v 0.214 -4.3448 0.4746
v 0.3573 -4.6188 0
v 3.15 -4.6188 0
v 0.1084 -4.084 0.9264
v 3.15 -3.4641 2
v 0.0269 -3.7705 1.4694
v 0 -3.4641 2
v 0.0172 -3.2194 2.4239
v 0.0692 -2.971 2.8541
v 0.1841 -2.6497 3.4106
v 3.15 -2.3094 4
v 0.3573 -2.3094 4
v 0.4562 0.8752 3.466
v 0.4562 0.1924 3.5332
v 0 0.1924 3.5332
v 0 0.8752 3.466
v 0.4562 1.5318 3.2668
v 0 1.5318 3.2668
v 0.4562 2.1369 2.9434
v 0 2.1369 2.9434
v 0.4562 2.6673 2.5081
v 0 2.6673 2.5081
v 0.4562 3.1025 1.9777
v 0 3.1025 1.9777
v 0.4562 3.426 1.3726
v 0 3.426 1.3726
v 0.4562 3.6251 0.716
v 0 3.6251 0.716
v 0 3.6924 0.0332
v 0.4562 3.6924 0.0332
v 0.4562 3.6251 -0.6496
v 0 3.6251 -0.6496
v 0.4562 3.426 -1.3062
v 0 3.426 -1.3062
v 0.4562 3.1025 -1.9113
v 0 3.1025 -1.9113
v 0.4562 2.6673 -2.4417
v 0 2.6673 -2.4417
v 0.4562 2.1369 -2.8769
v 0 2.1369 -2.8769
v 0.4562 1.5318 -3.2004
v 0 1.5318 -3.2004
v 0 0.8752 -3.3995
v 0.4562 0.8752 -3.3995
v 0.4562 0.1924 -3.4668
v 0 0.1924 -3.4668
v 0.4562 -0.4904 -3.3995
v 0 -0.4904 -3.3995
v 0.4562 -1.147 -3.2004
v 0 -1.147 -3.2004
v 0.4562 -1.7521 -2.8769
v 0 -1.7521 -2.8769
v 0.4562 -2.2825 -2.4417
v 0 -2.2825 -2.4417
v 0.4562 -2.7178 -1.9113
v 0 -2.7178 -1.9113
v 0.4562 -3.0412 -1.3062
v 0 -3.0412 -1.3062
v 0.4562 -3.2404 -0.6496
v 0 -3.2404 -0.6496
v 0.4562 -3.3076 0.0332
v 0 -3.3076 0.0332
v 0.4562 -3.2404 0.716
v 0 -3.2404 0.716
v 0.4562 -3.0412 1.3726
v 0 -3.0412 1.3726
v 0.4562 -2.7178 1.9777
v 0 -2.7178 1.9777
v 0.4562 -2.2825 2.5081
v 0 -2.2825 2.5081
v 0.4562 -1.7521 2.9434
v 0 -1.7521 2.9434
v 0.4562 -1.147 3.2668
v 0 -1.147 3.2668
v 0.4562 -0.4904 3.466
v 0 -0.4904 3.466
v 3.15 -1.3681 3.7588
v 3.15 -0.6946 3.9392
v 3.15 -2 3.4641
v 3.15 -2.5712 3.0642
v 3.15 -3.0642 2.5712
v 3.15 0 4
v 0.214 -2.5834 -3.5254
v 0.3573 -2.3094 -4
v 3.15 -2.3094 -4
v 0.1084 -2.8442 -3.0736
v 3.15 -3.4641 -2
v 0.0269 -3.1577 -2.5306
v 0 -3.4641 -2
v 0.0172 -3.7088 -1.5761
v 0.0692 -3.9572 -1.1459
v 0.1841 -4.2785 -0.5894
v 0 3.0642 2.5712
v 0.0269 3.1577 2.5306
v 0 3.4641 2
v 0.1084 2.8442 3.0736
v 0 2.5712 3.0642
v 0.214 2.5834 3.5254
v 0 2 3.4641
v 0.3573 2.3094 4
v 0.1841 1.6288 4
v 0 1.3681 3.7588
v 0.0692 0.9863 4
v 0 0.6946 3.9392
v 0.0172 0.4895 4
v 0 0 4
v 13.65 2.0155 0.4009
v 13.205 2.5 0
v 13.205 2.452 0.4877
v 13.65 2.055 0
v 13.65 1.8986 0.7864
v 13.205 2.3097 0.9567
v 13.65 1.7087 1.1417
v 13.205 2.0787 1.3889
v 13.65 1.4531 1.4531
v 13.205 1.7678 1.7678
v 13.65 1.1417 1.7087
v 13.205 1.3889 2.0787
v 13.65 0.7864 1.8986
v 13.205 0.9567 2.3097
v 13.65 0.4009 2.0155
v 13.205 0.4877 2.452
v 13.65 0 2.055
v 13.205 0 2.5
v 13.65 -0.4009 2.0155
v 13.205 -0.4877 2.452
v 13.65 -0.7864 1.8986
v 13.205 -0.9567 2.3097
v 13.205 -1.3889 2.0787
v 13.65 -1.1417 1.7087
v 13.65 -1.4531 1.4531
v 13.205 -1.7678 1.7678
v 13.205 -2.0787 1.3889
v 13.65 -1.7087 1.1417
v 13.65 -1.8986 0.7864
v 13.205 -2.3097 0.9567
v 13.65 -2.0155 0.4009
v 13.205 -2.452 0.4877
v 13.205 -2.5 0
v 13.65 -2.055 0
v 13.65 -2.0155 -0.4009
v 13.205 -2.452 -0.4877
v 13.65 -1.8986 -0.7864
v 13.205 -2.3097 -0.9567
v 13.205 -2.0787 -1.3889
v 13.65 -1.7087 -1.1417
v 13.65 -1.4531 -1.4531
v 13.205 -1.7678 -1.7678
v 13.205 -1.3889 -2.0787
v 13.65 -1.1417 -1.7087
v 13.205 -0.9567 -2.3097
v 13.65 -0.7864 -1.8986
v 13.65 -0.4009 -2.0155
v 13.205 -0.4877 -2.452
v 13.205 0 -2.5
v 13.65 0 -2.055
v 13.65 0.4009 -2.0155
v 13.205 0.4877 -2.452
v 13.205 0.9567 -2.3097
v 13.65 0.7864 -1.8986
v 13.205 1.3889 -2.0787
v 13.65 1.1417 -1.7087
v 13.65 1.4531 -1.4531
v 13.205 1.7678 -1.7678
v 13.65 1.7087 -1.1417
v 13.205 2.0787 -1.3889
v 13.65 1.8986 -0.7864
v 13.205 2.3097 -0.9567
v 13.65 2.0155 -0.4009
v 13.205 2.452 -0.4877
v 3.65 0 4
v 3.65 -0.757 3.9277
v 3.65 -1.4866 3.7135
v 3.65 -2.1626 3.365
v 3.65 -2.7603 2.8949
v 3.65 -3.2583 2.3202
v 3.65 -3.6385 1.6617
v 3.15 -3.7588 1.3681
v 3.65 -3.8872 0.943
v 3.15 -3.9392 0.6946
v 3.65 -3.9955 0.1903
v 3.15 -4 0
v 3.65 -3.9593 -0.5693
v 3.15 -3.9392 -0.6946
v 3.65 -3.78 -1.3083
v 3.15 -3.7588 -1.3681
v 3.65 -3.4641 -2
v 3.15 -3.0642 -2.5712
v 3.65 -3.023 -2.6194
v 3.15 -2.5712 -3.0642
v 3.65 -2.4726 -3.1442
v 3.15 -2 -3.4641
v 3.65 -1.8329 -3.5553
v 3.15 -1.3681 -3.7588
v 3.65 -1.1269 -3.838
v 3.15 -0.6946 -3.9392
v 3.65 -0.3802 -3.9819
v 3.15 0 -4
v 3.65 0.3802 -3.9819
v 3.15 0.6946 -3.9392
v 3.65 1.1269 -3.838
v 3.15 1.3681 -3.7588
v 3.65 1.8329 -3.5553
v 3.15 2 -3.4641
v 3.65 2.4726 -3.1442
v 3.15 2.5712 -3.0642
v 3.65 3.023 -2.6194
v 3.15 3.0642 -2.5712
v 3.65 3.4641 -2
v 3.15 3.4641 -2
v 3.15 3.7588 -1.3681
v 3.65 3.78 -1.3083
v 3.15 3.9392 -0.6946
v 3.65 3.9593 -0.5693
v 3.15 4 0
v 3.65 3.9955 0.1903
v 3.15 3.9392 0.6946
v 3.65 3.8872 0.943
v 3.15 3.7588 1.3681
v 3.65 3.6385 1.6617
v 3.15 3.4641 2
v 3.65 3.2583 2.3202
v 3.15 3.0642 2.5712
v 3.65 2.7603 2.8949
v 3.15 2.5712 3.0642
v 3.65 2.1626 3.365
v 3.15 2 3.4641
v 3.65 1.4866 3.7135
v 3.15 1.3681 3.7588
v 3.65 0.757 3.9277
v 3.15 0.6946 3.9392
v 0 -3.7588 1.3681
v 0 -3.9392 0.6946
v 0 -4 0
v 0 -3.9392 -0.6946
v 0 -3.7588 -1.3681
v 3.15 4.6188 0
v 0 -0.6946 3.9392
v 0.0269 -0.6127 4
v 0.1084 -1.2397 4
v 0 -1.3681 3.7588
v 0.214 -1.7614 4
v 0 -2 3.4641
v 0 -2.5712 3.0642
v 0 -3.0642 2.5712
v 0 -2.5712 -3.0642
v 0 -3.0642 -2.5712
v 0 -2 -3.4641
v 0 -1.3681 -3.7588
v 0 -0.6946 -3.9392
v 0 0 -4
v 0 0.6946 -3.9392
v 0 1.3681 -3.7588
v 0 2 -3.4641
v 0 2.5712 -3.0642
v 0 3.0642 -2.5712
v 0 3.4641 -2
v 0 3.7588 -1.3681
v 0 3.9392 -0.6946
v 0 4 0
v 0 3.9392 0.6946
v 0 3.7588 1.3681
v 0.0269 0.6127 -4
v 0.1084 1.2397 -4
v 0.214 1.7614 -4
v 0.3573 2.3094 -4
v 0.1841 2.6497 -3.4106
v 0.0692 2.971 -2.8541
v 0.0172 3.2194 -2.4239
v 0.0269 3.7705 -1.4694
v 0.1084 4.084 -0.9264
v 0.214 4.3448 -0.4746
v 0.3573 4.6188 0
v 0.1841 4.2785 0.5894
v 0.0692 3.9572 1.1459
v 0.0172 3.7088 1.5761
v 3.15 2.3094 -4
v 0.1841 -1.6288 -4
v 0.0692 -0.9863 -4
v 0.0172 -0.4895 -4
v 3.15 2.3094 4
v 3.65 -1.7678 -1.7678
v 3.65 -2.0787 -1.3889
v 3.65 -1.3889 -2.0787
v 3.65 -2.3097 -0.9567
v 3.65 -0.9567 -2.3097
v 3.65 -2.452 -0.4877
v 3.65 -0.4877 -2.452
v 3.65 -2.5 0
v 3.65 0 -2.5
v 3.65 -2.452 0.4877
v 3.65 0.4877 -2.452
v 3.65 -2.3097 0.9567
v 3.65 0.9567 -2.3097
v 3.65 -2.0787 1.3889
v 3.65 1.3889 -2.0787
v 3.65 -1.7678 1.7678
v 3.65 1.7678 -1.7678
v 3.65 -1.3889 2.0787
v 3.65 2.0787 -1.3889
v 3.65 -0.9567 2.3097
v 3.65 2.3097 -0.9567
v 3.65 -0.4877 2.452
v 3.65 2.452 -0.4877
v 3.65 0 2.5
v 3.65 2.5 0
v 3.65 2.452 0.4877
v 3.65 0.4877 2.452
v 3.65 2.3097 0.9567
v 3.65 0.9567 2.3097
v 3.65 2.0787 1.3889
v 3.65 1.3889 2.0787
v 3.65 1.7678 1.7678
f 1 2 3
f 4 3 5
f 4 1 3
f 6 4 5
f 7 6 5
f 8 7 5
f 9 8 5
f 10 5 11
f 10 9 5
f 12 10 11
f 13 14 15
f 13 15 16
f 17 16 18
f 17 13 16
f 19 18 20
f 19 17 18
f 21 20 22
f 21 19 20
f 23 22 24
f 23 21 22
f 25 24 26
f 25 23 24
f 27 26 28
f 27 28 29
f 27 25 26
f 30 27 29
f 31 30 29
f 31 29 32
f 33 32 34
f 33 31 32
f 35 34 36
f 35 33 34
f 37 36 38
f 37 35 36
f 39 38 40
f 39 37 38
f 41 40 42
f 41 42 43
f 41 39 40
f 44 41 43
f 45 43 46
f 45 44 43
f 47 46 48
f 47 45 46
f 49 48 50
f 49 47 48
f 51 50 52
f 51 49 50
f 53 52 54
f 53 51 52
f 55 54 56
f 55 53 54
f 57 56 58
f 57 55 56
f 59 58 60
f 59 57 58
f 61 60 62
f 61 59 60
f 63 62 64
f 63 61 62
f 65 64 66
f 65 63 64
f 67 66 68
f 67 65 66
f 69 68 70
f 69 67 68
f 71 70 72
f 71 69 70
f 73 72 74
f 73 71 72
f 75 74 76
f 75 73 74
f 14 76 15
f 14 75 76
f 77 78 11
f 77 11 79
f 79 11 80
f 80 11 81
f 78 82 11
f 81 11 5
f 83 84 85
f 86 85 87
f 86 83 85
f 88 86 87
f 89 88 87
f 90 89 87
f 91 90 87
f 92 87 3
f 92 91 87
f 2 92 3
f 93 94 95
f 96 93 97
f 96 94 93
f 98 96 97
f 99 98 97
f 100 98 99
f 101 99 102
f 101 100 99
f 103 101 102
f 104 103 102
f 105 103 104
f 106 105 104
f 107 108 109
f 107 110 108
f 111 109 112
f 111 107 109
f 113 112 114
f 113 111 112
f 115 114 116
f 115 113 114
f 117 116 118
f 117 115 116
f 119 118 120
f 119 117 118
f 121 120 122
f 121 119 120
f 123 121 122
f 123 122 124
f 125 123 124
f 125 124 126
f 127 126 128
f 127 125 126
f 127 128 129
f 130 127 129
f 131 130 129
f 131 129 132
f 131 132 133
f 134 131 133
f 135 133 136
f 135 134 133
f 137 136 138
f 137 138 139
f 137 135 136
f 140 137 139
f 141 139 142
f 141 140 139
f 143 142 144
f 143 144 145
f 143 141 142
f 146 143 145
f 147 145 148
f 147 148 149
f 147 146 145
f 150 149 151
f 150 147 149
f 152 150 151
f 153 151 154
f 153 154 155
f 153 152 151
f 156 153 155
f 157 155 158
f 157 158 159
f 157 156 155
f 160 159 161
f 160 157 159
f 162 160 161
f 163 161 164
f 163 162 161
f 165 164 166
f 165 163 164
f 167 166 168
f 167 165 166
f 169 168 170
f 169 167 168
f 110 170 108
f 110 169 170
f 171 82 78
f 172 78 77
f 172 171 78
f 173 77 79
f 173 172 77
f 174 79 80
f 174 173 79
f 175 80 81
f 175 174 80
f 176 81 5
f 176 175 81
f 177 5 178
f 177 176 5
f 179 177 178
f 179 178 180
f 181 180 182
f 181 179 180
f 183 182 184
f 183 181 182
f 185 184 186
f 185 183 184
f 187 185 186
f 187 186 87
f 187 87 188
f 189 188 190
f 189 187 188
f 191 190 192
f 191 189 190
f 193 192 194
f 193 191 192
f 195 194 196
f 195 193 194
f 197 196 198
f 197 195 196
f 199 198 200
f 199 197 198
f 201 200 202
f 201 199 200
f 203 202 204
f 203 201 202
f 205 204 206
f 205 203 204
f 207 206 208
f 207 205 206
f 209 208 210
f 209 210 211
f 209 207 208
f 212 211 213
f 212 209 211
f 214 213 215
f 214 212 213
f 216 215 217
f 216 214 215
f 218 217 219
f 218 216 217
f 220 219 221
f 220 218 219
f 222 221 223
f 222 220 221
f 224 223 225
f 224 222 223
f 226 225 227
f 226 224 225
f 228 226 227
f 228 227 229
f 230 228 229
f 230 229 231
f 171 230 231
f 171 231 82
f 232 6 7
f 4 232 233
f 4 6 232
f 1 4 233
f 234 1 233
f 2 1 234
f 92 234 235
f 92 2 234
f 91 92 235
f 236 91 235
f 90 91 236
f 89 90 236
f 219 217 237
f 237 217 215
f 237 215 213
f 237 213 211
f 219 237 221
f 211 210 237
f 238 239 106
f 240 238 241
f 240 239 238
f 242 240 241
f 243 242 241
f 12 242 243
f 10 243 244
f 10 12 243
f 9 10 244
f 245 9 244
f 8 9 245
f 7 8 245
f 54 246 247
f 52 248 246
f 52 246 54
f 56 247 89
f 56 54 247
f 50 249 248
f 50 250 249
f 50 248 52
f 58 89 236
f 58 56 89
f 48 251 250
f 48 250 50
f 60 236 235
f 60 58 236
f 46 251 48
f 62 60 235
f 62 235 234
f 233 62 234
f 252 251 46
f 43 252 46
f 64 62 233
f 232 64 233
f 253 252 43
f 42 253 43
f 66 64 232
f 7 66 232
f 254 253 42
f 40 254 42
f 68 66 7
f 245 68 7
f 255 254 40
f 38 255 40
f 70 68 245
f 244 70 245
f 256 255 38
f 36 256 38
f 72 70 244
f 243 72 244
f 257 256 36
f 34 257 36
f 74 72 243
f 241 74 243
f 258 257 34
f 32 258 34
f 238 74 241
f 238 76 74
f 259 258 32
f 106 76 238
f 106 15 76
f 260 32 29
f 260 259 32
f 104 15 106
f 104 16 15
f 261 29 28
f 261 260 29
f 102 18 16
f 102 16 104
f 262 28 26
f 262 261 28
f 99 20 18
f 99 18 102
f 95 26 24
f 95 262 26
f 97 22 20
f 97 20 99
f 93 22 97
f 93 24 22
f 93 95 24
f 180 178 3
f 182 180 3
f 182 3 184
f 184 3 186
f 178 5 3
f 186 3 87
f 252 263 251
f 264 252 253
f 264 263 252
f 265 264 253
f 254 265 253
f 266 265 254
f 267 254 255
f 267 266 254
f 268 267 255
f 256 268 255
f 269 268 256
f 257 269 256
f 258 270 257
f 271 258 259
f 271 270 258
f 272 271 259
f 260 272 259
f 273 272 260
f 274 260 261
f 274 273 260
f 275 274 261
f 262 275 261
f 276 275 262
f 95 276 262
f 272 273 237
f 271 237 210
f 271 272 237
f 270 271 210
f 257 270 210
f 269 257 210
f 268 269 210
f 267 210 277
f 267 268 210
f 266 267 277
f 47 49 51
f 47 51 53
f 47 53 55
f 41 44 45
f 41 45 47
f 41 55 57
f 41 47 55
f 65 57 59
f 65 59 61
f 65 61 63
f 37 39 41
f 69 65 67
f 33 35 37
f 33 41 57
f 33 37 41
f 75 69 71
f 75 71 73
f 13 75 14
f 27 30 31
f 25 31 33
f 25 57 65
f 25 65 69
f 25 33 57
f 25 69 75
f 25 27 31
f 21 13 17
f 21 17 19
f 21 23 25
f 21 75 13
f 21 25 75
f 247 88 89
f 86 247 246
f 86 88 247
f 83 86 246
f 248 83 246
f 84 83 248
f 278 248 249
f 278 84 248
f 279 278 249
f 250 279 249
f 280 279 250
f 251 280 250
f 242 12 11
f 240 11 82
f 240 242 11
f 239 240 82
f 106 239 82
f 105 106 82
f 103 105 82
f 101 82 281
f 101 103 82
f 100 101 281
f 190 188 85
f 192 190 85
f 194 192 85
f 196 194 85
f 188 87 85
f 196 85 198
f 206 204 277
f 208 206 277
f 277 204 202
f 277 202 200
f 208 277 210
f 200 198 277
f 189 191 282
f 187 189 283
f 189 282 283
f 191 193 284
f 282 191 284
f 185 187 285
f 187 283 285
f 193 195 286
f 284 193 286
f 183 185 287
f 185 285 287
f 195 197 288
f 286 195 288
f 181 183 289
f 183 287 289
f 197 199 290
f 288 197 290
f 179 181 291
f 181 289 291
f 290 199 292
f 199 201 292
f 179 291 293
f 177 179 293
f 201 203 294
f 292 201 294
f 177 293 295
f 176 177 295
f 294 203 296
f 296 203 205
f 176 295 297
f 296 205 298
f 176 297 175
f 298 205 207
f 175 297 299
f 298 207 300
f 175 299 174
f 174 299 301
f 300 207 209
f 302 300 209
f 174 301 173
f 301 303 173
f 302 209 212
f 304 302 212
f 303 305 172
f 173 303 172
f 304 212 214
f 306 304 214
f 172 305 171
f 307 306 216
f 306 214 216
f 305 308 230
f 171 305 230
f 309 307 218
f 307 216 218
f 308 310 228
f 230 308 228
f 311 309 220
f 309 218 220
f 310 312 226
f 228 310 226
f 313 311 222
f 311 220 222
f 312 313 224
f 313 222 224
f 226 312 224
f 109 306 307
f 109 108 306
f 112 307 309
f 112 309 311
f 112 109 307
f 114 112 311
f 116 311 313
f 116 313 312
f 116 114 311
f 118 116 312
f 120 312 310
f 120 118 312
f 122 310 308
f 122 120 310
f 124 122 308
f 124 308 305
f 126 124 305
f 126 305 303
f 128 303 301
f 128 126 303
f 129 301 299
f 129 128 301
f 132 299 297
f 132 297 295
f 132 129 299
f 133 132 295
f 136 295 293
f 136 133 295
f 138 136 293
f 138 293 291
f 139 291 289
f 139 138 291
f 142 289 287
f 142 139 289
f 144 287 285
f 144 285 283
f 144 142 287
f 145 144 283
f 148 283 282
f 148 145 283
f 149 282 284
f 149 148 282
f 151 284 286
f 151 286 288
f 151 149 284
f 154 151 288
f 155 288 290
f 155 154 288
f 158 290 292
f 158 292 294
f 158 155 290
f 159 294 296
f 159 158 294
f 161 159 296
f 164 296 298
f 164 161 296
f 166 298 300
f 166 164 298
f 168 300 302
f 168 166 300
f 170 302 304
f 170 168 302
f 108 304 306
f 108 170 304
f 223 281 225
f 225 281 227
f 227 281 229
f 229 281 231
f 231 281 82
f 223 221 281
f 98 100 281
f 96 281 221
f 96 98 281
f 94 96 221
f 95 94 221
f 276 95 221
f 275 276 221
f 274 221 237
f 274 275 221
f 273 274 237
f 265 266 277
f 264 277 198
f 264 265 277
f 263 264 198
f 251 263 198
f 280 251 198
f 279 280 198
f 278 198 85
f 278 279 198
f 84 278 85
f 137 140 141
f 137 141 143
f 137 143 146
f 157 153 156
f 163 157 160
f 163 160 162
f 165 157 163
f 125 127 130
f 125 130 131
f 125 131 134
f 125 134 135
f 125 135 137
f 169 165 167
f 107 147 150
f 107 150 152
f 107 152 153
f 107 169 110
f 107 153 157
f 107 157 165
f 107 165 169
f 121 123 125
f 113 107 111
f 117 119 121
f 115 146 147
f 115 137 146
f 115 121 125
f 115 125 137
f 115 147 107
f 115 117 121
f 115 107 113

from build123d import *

# Parameters (mm, degrees)
BASEHEAD_DEPTH     = 3.65
INDENT_START       = -0.45625
INDENT_2_OUTLINE_R = 3.5
INDENT_2_DEPTH     = 0.45625
SKETCH4_W          = 0.5
SKETCH4_H          = 10.618802154


# Read off the part's stored shape, not the designer's step: Indent
with BuildPart() as part:
    # Sketch1 → BaseHead (new body)
    with BuildSketch(Plane(origin=(0, 0, 0), x_dir=(0, 0, -1), z_dir=(1, 0, 0))):
        Polygon((4, 2.309401077), (4, -2.309401077), (0, -4.618802154), (-4, -2.309401077), (-4, 2.309401077), (0, 4.618802154), align=None)
    extrude(amount=BASEHEAD_DEPTH)

    # Indent outline → Indent (revolve)
    with BuildSketch(Plane.YX):
        Polygon((2.5, 3.65), (2.5, 13.205), (2.055, 13.65), (0, 13.65), (0, 3.65), align=None)
    revolve(axis=Axis((0, 0, 0), (1, 0, 0)))

    # Indent 2 outline → Indent 2 (cut)
    with BuildSketch(Plane.ZY.offset(INDENT_START)):
        with Locations((0.033212245, 0.192376607)):
            Circle(INDENT_2_OUTLINE_R)
    extrude(amount=INDENT_2_DEPTH, mode=Mode.SUBTRACT)

    # Sketch3 → HeadChamfer (revolve, cut)
    with BuildSketch(Plane.XY, mode=Mode.PRIVATE) as headchamfer_sk:
        Polygon((0, 4), (3.244016936, 9.618802154), (3.244016936, 14.618802154), (-10, 14.618802154), (-10, 4), align=None)
    revolve(headchamfer_sk.sketch.rotate(Axis((0, 0, 0), (1, 0, 0)), 90), axis=Axis((0, 0, 0), (1, 0, 0)), mode=Mode.SUBTRACT)

    # Sketch4 → BearingFace (revolve, cut)
    with BuildSketch(Plane.XY, mode=Mode.PRIVATE) as bearingface_sk:
        with Locations((3.4, 9.309401077)):
            Rectangle(SKETCH4_W, SKETCH4_H)
    revolve(bearingface_sk.sketch.rotate(Axis((0, 0, 0), (1, 0, 0)), 90), axis=Axis((0, 0, 0), (1, 0, 0)), mode=Mode.SUBTRACT)


solid = part.part
